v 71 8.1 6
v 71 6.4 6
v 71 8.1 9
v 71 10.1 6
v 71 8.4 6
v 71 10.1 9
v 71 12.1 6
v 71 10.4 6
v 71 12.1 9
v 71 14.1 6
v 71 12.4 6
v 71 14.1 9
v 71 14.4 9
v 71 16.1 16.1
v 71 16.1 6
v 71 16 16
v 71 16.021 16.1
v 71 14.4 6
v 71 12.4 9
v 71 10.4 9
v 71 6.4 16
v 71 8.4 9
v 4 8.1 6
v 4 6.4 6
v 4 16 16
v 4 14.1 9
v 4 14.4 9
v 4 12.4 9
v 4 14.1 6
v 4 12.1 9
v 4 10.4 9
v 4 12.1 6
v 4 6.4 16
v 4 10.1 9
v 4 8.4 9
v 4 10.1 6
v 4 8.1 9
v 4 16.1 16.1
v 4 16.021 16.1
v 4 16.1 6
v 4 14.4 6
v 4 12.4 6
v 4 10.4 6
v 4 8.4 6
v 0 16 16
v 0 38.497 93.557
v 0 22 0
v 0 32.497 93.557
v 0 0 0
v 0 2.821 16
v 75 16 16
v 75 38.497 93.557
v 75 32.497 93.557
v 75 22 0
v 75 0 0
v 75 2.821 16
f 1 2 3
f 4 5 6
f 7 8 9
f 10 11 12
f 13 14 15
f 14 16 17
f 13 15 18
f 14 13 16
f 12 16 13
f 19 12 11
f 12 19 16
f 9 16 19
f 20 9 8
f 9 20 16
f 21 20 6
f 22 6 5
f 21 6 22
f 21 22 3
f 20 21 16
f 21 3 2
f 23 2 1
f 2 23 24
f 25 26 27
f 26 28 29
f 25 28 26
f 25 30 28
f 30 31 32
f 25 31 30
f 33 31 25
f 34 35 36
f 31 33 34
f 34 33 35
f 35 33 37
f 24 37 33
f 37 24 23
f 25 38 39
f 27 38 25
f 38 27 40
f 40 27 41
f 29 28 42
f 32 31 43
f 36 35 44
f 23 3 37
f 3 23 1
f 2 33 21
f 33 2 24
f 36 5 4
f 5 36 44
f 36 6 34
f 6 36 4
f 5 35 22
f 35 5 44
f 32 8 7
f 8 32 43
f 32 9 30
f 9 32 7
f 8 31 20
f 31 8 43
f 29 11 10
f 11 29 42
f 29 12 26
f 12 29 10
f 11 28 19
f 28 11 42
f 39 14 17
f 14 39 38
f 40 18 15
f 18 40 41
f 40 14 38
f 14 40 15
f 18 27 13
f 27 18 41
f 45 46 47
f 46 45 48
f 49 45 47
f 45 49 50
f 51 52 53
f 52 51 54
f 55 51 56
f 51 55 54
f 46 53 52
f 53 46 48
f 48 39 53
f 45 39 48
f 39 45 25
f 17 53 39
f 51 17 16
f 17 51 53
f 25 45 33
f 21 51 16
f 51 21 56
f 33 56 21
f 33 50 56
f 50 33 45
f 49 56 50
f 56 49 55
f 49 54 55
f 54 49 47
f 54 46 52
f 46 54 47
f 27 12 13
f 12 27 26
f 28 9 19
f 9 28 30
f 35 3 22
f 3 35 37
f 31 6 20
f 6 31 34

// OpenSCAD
// pb_card_stand_v2.scad — PrimeBind Single Card Display Stand
//
// L-shaped body: compact flat base + tall tilted back wall, single polygon extrusion.
// Base bottom and wall bottom both at Z=0 — completely flat on the bed. ✓
// Front face tilted at same angle as the wall (TILT degrees).
// Card groove at base-wall inner junction holds up to 5 sleeved cards.
// PrimeBind SVG logo debossed into the angled base front face.
// Peg (right side) + socket (left side) let stands snap together side by side.
//
// Print: Matte PLA | flat on bed | no supports needed
// Minitest: 50% scale in Creality Print — verify groove before full print

// ── Card + sleeve ─────────────────────────────────────────────────────────────
CARD_W     = 63.0;
SLEEVE_ADD = 3.6;
SLEEVE_T   = 1.2;
SLOT_W     = CARD_W + SLEEVE_ADD + 0.4;    // 67mm

// ── Stand geometry ────────────────────────────────────────────────────────────
TILT       = 10;
BASE_W     = SLOT_W + 8;       // 75mm (4mm wall each side)
BASE_D     = 22;               // front-to-back depth of base
BASE_H     = 16;               // base slab height
WALL_T     = 6;                // back wall thickness (slimmed down)
WALL_H     = 95;               // back wall total height from Z=0
LEAN       = WALL_H * sin(TILT);

// ── Card grooves ──────────────────────────────────────────────────────────────
GROOVE_T   = SLEEVE_T + 0.4;              // 1.6mm per card slot
GROOVE_H   = 10;
WALL_SIDE  = (BASE_W - SLOT_W) / 2;       // 4mm
NUM_CARDS  = 5;
RIB_T      = 0.4;
RIB_H      = 3;                            // short rib height from groove floor
GROOVE_T_TOTAL = NUM_CARDS * GROOVE_T + (NUM_CARDS - 1) * RIB_T;  // 9.6mm

// ── Logo ─────────────────────────────────────────────────────────────────────
// SVG artboard: 1122.52 × 793.70 px = 297 × 210mm at 96dpi.
// OpenSCAD imports in mm, so path coords are scaled by 0.2646 (= 297/1122.52).
// Content centroid in OpenSCAD mm: (346.48 × 0.2646, 221.64 × 0.2646) = (91.65, 58.67).
LOGO_SCALE = 0.08;
LOGO_DEPTH = 1.0;
LOGO_CX    = 0;                // fine-tune X on base face
LOGO_CZ    = 4;                // fine-tune Z on base face

echo("──────────────────────────────────────");
echo("Width:", BASE_W, "mm | Depth:", BASE_D, "mm | Wall:", WALL_T, "mm thick");
echo("Height:", WALL_H * cos(TILT), "mm");
echo("Groove total:", GROOVE_T_TOTAL, "mm | Cards:", NUM_CARDS);
echo("──────────────────────────────────────");


// ── Logo profile — centered at 2D origin ─────────────────────────────────────
module logo_profile() {
    // Translate by the DPI-corrected content centroid so the logo is at (0,0).
    // SVG Y is flipped (0=top in SVG, 0=bottom in OpenSCAD).
    // Content centroid in OpenSCAD 2D: X=346.48×0.2646=91.65, Y=(793.70-221.64)×0.2646=151.36.
    translate([-91.65, -151.36])
        import("primebindlogo.svg");
}


module card_stand() {
    difference() {
        // ── L-shaped body ─────────────────────────────────────────────────
        rotate([90, 0, 90])
        linear_extrude(BASE_W)
        polygon([
            [0,                          0                  ],  // A front-bottom
            [BASE_D,                     0                  ],  // B rear-bottom
            [BASE_D + LEAN,              WALL_H * cos(TILT) ],  // C wall top-outer
            [BASE_D - WALL_T + LEAN,     WALL_H * cos(TILT) ],  // D wall top-inner
            [BASE_D - WALL_T,            BASE_H             ],  // E inner junction
            [BASE_H * tan(TILT),         BASE_H             ]   // F front-top (tilted)
        ]);

        // ── Card grooves ──────────────────────────────────────────────────────
        // Wide shallow cut: open zone across all 5 positions (top GROOVE_H-RIB_H).
        translate([WALL_SIDE,
                   BASE_D - WALL_T - GROOVE_T_TOTAL,
                   BASE_H - (GROOVE_H - RIB_H)])
            cube([SLOT_W, GROOVE_T_TOTAL + 0.1, GROOVE_H - RIB_H + 0.1]);
        // Narrow deep cuts: 5 channels with 4 short ribs at the bottom.
        for (i = [0:NUM_CARDS-1]) {
            translate([WALL_SIDE,
                       BASE_D - WALL_T - GROOVE_T_TOTAL + i * (GROOVE_T + RIB_T),
                       BASE_H - GROOVE_H])
                cube([SLOT_W, GROOVE_T + 0.1, GROOVE_H + 0.1]);
        }

        // logo deboss removed — add back when ready
    }
}


card_stand();
